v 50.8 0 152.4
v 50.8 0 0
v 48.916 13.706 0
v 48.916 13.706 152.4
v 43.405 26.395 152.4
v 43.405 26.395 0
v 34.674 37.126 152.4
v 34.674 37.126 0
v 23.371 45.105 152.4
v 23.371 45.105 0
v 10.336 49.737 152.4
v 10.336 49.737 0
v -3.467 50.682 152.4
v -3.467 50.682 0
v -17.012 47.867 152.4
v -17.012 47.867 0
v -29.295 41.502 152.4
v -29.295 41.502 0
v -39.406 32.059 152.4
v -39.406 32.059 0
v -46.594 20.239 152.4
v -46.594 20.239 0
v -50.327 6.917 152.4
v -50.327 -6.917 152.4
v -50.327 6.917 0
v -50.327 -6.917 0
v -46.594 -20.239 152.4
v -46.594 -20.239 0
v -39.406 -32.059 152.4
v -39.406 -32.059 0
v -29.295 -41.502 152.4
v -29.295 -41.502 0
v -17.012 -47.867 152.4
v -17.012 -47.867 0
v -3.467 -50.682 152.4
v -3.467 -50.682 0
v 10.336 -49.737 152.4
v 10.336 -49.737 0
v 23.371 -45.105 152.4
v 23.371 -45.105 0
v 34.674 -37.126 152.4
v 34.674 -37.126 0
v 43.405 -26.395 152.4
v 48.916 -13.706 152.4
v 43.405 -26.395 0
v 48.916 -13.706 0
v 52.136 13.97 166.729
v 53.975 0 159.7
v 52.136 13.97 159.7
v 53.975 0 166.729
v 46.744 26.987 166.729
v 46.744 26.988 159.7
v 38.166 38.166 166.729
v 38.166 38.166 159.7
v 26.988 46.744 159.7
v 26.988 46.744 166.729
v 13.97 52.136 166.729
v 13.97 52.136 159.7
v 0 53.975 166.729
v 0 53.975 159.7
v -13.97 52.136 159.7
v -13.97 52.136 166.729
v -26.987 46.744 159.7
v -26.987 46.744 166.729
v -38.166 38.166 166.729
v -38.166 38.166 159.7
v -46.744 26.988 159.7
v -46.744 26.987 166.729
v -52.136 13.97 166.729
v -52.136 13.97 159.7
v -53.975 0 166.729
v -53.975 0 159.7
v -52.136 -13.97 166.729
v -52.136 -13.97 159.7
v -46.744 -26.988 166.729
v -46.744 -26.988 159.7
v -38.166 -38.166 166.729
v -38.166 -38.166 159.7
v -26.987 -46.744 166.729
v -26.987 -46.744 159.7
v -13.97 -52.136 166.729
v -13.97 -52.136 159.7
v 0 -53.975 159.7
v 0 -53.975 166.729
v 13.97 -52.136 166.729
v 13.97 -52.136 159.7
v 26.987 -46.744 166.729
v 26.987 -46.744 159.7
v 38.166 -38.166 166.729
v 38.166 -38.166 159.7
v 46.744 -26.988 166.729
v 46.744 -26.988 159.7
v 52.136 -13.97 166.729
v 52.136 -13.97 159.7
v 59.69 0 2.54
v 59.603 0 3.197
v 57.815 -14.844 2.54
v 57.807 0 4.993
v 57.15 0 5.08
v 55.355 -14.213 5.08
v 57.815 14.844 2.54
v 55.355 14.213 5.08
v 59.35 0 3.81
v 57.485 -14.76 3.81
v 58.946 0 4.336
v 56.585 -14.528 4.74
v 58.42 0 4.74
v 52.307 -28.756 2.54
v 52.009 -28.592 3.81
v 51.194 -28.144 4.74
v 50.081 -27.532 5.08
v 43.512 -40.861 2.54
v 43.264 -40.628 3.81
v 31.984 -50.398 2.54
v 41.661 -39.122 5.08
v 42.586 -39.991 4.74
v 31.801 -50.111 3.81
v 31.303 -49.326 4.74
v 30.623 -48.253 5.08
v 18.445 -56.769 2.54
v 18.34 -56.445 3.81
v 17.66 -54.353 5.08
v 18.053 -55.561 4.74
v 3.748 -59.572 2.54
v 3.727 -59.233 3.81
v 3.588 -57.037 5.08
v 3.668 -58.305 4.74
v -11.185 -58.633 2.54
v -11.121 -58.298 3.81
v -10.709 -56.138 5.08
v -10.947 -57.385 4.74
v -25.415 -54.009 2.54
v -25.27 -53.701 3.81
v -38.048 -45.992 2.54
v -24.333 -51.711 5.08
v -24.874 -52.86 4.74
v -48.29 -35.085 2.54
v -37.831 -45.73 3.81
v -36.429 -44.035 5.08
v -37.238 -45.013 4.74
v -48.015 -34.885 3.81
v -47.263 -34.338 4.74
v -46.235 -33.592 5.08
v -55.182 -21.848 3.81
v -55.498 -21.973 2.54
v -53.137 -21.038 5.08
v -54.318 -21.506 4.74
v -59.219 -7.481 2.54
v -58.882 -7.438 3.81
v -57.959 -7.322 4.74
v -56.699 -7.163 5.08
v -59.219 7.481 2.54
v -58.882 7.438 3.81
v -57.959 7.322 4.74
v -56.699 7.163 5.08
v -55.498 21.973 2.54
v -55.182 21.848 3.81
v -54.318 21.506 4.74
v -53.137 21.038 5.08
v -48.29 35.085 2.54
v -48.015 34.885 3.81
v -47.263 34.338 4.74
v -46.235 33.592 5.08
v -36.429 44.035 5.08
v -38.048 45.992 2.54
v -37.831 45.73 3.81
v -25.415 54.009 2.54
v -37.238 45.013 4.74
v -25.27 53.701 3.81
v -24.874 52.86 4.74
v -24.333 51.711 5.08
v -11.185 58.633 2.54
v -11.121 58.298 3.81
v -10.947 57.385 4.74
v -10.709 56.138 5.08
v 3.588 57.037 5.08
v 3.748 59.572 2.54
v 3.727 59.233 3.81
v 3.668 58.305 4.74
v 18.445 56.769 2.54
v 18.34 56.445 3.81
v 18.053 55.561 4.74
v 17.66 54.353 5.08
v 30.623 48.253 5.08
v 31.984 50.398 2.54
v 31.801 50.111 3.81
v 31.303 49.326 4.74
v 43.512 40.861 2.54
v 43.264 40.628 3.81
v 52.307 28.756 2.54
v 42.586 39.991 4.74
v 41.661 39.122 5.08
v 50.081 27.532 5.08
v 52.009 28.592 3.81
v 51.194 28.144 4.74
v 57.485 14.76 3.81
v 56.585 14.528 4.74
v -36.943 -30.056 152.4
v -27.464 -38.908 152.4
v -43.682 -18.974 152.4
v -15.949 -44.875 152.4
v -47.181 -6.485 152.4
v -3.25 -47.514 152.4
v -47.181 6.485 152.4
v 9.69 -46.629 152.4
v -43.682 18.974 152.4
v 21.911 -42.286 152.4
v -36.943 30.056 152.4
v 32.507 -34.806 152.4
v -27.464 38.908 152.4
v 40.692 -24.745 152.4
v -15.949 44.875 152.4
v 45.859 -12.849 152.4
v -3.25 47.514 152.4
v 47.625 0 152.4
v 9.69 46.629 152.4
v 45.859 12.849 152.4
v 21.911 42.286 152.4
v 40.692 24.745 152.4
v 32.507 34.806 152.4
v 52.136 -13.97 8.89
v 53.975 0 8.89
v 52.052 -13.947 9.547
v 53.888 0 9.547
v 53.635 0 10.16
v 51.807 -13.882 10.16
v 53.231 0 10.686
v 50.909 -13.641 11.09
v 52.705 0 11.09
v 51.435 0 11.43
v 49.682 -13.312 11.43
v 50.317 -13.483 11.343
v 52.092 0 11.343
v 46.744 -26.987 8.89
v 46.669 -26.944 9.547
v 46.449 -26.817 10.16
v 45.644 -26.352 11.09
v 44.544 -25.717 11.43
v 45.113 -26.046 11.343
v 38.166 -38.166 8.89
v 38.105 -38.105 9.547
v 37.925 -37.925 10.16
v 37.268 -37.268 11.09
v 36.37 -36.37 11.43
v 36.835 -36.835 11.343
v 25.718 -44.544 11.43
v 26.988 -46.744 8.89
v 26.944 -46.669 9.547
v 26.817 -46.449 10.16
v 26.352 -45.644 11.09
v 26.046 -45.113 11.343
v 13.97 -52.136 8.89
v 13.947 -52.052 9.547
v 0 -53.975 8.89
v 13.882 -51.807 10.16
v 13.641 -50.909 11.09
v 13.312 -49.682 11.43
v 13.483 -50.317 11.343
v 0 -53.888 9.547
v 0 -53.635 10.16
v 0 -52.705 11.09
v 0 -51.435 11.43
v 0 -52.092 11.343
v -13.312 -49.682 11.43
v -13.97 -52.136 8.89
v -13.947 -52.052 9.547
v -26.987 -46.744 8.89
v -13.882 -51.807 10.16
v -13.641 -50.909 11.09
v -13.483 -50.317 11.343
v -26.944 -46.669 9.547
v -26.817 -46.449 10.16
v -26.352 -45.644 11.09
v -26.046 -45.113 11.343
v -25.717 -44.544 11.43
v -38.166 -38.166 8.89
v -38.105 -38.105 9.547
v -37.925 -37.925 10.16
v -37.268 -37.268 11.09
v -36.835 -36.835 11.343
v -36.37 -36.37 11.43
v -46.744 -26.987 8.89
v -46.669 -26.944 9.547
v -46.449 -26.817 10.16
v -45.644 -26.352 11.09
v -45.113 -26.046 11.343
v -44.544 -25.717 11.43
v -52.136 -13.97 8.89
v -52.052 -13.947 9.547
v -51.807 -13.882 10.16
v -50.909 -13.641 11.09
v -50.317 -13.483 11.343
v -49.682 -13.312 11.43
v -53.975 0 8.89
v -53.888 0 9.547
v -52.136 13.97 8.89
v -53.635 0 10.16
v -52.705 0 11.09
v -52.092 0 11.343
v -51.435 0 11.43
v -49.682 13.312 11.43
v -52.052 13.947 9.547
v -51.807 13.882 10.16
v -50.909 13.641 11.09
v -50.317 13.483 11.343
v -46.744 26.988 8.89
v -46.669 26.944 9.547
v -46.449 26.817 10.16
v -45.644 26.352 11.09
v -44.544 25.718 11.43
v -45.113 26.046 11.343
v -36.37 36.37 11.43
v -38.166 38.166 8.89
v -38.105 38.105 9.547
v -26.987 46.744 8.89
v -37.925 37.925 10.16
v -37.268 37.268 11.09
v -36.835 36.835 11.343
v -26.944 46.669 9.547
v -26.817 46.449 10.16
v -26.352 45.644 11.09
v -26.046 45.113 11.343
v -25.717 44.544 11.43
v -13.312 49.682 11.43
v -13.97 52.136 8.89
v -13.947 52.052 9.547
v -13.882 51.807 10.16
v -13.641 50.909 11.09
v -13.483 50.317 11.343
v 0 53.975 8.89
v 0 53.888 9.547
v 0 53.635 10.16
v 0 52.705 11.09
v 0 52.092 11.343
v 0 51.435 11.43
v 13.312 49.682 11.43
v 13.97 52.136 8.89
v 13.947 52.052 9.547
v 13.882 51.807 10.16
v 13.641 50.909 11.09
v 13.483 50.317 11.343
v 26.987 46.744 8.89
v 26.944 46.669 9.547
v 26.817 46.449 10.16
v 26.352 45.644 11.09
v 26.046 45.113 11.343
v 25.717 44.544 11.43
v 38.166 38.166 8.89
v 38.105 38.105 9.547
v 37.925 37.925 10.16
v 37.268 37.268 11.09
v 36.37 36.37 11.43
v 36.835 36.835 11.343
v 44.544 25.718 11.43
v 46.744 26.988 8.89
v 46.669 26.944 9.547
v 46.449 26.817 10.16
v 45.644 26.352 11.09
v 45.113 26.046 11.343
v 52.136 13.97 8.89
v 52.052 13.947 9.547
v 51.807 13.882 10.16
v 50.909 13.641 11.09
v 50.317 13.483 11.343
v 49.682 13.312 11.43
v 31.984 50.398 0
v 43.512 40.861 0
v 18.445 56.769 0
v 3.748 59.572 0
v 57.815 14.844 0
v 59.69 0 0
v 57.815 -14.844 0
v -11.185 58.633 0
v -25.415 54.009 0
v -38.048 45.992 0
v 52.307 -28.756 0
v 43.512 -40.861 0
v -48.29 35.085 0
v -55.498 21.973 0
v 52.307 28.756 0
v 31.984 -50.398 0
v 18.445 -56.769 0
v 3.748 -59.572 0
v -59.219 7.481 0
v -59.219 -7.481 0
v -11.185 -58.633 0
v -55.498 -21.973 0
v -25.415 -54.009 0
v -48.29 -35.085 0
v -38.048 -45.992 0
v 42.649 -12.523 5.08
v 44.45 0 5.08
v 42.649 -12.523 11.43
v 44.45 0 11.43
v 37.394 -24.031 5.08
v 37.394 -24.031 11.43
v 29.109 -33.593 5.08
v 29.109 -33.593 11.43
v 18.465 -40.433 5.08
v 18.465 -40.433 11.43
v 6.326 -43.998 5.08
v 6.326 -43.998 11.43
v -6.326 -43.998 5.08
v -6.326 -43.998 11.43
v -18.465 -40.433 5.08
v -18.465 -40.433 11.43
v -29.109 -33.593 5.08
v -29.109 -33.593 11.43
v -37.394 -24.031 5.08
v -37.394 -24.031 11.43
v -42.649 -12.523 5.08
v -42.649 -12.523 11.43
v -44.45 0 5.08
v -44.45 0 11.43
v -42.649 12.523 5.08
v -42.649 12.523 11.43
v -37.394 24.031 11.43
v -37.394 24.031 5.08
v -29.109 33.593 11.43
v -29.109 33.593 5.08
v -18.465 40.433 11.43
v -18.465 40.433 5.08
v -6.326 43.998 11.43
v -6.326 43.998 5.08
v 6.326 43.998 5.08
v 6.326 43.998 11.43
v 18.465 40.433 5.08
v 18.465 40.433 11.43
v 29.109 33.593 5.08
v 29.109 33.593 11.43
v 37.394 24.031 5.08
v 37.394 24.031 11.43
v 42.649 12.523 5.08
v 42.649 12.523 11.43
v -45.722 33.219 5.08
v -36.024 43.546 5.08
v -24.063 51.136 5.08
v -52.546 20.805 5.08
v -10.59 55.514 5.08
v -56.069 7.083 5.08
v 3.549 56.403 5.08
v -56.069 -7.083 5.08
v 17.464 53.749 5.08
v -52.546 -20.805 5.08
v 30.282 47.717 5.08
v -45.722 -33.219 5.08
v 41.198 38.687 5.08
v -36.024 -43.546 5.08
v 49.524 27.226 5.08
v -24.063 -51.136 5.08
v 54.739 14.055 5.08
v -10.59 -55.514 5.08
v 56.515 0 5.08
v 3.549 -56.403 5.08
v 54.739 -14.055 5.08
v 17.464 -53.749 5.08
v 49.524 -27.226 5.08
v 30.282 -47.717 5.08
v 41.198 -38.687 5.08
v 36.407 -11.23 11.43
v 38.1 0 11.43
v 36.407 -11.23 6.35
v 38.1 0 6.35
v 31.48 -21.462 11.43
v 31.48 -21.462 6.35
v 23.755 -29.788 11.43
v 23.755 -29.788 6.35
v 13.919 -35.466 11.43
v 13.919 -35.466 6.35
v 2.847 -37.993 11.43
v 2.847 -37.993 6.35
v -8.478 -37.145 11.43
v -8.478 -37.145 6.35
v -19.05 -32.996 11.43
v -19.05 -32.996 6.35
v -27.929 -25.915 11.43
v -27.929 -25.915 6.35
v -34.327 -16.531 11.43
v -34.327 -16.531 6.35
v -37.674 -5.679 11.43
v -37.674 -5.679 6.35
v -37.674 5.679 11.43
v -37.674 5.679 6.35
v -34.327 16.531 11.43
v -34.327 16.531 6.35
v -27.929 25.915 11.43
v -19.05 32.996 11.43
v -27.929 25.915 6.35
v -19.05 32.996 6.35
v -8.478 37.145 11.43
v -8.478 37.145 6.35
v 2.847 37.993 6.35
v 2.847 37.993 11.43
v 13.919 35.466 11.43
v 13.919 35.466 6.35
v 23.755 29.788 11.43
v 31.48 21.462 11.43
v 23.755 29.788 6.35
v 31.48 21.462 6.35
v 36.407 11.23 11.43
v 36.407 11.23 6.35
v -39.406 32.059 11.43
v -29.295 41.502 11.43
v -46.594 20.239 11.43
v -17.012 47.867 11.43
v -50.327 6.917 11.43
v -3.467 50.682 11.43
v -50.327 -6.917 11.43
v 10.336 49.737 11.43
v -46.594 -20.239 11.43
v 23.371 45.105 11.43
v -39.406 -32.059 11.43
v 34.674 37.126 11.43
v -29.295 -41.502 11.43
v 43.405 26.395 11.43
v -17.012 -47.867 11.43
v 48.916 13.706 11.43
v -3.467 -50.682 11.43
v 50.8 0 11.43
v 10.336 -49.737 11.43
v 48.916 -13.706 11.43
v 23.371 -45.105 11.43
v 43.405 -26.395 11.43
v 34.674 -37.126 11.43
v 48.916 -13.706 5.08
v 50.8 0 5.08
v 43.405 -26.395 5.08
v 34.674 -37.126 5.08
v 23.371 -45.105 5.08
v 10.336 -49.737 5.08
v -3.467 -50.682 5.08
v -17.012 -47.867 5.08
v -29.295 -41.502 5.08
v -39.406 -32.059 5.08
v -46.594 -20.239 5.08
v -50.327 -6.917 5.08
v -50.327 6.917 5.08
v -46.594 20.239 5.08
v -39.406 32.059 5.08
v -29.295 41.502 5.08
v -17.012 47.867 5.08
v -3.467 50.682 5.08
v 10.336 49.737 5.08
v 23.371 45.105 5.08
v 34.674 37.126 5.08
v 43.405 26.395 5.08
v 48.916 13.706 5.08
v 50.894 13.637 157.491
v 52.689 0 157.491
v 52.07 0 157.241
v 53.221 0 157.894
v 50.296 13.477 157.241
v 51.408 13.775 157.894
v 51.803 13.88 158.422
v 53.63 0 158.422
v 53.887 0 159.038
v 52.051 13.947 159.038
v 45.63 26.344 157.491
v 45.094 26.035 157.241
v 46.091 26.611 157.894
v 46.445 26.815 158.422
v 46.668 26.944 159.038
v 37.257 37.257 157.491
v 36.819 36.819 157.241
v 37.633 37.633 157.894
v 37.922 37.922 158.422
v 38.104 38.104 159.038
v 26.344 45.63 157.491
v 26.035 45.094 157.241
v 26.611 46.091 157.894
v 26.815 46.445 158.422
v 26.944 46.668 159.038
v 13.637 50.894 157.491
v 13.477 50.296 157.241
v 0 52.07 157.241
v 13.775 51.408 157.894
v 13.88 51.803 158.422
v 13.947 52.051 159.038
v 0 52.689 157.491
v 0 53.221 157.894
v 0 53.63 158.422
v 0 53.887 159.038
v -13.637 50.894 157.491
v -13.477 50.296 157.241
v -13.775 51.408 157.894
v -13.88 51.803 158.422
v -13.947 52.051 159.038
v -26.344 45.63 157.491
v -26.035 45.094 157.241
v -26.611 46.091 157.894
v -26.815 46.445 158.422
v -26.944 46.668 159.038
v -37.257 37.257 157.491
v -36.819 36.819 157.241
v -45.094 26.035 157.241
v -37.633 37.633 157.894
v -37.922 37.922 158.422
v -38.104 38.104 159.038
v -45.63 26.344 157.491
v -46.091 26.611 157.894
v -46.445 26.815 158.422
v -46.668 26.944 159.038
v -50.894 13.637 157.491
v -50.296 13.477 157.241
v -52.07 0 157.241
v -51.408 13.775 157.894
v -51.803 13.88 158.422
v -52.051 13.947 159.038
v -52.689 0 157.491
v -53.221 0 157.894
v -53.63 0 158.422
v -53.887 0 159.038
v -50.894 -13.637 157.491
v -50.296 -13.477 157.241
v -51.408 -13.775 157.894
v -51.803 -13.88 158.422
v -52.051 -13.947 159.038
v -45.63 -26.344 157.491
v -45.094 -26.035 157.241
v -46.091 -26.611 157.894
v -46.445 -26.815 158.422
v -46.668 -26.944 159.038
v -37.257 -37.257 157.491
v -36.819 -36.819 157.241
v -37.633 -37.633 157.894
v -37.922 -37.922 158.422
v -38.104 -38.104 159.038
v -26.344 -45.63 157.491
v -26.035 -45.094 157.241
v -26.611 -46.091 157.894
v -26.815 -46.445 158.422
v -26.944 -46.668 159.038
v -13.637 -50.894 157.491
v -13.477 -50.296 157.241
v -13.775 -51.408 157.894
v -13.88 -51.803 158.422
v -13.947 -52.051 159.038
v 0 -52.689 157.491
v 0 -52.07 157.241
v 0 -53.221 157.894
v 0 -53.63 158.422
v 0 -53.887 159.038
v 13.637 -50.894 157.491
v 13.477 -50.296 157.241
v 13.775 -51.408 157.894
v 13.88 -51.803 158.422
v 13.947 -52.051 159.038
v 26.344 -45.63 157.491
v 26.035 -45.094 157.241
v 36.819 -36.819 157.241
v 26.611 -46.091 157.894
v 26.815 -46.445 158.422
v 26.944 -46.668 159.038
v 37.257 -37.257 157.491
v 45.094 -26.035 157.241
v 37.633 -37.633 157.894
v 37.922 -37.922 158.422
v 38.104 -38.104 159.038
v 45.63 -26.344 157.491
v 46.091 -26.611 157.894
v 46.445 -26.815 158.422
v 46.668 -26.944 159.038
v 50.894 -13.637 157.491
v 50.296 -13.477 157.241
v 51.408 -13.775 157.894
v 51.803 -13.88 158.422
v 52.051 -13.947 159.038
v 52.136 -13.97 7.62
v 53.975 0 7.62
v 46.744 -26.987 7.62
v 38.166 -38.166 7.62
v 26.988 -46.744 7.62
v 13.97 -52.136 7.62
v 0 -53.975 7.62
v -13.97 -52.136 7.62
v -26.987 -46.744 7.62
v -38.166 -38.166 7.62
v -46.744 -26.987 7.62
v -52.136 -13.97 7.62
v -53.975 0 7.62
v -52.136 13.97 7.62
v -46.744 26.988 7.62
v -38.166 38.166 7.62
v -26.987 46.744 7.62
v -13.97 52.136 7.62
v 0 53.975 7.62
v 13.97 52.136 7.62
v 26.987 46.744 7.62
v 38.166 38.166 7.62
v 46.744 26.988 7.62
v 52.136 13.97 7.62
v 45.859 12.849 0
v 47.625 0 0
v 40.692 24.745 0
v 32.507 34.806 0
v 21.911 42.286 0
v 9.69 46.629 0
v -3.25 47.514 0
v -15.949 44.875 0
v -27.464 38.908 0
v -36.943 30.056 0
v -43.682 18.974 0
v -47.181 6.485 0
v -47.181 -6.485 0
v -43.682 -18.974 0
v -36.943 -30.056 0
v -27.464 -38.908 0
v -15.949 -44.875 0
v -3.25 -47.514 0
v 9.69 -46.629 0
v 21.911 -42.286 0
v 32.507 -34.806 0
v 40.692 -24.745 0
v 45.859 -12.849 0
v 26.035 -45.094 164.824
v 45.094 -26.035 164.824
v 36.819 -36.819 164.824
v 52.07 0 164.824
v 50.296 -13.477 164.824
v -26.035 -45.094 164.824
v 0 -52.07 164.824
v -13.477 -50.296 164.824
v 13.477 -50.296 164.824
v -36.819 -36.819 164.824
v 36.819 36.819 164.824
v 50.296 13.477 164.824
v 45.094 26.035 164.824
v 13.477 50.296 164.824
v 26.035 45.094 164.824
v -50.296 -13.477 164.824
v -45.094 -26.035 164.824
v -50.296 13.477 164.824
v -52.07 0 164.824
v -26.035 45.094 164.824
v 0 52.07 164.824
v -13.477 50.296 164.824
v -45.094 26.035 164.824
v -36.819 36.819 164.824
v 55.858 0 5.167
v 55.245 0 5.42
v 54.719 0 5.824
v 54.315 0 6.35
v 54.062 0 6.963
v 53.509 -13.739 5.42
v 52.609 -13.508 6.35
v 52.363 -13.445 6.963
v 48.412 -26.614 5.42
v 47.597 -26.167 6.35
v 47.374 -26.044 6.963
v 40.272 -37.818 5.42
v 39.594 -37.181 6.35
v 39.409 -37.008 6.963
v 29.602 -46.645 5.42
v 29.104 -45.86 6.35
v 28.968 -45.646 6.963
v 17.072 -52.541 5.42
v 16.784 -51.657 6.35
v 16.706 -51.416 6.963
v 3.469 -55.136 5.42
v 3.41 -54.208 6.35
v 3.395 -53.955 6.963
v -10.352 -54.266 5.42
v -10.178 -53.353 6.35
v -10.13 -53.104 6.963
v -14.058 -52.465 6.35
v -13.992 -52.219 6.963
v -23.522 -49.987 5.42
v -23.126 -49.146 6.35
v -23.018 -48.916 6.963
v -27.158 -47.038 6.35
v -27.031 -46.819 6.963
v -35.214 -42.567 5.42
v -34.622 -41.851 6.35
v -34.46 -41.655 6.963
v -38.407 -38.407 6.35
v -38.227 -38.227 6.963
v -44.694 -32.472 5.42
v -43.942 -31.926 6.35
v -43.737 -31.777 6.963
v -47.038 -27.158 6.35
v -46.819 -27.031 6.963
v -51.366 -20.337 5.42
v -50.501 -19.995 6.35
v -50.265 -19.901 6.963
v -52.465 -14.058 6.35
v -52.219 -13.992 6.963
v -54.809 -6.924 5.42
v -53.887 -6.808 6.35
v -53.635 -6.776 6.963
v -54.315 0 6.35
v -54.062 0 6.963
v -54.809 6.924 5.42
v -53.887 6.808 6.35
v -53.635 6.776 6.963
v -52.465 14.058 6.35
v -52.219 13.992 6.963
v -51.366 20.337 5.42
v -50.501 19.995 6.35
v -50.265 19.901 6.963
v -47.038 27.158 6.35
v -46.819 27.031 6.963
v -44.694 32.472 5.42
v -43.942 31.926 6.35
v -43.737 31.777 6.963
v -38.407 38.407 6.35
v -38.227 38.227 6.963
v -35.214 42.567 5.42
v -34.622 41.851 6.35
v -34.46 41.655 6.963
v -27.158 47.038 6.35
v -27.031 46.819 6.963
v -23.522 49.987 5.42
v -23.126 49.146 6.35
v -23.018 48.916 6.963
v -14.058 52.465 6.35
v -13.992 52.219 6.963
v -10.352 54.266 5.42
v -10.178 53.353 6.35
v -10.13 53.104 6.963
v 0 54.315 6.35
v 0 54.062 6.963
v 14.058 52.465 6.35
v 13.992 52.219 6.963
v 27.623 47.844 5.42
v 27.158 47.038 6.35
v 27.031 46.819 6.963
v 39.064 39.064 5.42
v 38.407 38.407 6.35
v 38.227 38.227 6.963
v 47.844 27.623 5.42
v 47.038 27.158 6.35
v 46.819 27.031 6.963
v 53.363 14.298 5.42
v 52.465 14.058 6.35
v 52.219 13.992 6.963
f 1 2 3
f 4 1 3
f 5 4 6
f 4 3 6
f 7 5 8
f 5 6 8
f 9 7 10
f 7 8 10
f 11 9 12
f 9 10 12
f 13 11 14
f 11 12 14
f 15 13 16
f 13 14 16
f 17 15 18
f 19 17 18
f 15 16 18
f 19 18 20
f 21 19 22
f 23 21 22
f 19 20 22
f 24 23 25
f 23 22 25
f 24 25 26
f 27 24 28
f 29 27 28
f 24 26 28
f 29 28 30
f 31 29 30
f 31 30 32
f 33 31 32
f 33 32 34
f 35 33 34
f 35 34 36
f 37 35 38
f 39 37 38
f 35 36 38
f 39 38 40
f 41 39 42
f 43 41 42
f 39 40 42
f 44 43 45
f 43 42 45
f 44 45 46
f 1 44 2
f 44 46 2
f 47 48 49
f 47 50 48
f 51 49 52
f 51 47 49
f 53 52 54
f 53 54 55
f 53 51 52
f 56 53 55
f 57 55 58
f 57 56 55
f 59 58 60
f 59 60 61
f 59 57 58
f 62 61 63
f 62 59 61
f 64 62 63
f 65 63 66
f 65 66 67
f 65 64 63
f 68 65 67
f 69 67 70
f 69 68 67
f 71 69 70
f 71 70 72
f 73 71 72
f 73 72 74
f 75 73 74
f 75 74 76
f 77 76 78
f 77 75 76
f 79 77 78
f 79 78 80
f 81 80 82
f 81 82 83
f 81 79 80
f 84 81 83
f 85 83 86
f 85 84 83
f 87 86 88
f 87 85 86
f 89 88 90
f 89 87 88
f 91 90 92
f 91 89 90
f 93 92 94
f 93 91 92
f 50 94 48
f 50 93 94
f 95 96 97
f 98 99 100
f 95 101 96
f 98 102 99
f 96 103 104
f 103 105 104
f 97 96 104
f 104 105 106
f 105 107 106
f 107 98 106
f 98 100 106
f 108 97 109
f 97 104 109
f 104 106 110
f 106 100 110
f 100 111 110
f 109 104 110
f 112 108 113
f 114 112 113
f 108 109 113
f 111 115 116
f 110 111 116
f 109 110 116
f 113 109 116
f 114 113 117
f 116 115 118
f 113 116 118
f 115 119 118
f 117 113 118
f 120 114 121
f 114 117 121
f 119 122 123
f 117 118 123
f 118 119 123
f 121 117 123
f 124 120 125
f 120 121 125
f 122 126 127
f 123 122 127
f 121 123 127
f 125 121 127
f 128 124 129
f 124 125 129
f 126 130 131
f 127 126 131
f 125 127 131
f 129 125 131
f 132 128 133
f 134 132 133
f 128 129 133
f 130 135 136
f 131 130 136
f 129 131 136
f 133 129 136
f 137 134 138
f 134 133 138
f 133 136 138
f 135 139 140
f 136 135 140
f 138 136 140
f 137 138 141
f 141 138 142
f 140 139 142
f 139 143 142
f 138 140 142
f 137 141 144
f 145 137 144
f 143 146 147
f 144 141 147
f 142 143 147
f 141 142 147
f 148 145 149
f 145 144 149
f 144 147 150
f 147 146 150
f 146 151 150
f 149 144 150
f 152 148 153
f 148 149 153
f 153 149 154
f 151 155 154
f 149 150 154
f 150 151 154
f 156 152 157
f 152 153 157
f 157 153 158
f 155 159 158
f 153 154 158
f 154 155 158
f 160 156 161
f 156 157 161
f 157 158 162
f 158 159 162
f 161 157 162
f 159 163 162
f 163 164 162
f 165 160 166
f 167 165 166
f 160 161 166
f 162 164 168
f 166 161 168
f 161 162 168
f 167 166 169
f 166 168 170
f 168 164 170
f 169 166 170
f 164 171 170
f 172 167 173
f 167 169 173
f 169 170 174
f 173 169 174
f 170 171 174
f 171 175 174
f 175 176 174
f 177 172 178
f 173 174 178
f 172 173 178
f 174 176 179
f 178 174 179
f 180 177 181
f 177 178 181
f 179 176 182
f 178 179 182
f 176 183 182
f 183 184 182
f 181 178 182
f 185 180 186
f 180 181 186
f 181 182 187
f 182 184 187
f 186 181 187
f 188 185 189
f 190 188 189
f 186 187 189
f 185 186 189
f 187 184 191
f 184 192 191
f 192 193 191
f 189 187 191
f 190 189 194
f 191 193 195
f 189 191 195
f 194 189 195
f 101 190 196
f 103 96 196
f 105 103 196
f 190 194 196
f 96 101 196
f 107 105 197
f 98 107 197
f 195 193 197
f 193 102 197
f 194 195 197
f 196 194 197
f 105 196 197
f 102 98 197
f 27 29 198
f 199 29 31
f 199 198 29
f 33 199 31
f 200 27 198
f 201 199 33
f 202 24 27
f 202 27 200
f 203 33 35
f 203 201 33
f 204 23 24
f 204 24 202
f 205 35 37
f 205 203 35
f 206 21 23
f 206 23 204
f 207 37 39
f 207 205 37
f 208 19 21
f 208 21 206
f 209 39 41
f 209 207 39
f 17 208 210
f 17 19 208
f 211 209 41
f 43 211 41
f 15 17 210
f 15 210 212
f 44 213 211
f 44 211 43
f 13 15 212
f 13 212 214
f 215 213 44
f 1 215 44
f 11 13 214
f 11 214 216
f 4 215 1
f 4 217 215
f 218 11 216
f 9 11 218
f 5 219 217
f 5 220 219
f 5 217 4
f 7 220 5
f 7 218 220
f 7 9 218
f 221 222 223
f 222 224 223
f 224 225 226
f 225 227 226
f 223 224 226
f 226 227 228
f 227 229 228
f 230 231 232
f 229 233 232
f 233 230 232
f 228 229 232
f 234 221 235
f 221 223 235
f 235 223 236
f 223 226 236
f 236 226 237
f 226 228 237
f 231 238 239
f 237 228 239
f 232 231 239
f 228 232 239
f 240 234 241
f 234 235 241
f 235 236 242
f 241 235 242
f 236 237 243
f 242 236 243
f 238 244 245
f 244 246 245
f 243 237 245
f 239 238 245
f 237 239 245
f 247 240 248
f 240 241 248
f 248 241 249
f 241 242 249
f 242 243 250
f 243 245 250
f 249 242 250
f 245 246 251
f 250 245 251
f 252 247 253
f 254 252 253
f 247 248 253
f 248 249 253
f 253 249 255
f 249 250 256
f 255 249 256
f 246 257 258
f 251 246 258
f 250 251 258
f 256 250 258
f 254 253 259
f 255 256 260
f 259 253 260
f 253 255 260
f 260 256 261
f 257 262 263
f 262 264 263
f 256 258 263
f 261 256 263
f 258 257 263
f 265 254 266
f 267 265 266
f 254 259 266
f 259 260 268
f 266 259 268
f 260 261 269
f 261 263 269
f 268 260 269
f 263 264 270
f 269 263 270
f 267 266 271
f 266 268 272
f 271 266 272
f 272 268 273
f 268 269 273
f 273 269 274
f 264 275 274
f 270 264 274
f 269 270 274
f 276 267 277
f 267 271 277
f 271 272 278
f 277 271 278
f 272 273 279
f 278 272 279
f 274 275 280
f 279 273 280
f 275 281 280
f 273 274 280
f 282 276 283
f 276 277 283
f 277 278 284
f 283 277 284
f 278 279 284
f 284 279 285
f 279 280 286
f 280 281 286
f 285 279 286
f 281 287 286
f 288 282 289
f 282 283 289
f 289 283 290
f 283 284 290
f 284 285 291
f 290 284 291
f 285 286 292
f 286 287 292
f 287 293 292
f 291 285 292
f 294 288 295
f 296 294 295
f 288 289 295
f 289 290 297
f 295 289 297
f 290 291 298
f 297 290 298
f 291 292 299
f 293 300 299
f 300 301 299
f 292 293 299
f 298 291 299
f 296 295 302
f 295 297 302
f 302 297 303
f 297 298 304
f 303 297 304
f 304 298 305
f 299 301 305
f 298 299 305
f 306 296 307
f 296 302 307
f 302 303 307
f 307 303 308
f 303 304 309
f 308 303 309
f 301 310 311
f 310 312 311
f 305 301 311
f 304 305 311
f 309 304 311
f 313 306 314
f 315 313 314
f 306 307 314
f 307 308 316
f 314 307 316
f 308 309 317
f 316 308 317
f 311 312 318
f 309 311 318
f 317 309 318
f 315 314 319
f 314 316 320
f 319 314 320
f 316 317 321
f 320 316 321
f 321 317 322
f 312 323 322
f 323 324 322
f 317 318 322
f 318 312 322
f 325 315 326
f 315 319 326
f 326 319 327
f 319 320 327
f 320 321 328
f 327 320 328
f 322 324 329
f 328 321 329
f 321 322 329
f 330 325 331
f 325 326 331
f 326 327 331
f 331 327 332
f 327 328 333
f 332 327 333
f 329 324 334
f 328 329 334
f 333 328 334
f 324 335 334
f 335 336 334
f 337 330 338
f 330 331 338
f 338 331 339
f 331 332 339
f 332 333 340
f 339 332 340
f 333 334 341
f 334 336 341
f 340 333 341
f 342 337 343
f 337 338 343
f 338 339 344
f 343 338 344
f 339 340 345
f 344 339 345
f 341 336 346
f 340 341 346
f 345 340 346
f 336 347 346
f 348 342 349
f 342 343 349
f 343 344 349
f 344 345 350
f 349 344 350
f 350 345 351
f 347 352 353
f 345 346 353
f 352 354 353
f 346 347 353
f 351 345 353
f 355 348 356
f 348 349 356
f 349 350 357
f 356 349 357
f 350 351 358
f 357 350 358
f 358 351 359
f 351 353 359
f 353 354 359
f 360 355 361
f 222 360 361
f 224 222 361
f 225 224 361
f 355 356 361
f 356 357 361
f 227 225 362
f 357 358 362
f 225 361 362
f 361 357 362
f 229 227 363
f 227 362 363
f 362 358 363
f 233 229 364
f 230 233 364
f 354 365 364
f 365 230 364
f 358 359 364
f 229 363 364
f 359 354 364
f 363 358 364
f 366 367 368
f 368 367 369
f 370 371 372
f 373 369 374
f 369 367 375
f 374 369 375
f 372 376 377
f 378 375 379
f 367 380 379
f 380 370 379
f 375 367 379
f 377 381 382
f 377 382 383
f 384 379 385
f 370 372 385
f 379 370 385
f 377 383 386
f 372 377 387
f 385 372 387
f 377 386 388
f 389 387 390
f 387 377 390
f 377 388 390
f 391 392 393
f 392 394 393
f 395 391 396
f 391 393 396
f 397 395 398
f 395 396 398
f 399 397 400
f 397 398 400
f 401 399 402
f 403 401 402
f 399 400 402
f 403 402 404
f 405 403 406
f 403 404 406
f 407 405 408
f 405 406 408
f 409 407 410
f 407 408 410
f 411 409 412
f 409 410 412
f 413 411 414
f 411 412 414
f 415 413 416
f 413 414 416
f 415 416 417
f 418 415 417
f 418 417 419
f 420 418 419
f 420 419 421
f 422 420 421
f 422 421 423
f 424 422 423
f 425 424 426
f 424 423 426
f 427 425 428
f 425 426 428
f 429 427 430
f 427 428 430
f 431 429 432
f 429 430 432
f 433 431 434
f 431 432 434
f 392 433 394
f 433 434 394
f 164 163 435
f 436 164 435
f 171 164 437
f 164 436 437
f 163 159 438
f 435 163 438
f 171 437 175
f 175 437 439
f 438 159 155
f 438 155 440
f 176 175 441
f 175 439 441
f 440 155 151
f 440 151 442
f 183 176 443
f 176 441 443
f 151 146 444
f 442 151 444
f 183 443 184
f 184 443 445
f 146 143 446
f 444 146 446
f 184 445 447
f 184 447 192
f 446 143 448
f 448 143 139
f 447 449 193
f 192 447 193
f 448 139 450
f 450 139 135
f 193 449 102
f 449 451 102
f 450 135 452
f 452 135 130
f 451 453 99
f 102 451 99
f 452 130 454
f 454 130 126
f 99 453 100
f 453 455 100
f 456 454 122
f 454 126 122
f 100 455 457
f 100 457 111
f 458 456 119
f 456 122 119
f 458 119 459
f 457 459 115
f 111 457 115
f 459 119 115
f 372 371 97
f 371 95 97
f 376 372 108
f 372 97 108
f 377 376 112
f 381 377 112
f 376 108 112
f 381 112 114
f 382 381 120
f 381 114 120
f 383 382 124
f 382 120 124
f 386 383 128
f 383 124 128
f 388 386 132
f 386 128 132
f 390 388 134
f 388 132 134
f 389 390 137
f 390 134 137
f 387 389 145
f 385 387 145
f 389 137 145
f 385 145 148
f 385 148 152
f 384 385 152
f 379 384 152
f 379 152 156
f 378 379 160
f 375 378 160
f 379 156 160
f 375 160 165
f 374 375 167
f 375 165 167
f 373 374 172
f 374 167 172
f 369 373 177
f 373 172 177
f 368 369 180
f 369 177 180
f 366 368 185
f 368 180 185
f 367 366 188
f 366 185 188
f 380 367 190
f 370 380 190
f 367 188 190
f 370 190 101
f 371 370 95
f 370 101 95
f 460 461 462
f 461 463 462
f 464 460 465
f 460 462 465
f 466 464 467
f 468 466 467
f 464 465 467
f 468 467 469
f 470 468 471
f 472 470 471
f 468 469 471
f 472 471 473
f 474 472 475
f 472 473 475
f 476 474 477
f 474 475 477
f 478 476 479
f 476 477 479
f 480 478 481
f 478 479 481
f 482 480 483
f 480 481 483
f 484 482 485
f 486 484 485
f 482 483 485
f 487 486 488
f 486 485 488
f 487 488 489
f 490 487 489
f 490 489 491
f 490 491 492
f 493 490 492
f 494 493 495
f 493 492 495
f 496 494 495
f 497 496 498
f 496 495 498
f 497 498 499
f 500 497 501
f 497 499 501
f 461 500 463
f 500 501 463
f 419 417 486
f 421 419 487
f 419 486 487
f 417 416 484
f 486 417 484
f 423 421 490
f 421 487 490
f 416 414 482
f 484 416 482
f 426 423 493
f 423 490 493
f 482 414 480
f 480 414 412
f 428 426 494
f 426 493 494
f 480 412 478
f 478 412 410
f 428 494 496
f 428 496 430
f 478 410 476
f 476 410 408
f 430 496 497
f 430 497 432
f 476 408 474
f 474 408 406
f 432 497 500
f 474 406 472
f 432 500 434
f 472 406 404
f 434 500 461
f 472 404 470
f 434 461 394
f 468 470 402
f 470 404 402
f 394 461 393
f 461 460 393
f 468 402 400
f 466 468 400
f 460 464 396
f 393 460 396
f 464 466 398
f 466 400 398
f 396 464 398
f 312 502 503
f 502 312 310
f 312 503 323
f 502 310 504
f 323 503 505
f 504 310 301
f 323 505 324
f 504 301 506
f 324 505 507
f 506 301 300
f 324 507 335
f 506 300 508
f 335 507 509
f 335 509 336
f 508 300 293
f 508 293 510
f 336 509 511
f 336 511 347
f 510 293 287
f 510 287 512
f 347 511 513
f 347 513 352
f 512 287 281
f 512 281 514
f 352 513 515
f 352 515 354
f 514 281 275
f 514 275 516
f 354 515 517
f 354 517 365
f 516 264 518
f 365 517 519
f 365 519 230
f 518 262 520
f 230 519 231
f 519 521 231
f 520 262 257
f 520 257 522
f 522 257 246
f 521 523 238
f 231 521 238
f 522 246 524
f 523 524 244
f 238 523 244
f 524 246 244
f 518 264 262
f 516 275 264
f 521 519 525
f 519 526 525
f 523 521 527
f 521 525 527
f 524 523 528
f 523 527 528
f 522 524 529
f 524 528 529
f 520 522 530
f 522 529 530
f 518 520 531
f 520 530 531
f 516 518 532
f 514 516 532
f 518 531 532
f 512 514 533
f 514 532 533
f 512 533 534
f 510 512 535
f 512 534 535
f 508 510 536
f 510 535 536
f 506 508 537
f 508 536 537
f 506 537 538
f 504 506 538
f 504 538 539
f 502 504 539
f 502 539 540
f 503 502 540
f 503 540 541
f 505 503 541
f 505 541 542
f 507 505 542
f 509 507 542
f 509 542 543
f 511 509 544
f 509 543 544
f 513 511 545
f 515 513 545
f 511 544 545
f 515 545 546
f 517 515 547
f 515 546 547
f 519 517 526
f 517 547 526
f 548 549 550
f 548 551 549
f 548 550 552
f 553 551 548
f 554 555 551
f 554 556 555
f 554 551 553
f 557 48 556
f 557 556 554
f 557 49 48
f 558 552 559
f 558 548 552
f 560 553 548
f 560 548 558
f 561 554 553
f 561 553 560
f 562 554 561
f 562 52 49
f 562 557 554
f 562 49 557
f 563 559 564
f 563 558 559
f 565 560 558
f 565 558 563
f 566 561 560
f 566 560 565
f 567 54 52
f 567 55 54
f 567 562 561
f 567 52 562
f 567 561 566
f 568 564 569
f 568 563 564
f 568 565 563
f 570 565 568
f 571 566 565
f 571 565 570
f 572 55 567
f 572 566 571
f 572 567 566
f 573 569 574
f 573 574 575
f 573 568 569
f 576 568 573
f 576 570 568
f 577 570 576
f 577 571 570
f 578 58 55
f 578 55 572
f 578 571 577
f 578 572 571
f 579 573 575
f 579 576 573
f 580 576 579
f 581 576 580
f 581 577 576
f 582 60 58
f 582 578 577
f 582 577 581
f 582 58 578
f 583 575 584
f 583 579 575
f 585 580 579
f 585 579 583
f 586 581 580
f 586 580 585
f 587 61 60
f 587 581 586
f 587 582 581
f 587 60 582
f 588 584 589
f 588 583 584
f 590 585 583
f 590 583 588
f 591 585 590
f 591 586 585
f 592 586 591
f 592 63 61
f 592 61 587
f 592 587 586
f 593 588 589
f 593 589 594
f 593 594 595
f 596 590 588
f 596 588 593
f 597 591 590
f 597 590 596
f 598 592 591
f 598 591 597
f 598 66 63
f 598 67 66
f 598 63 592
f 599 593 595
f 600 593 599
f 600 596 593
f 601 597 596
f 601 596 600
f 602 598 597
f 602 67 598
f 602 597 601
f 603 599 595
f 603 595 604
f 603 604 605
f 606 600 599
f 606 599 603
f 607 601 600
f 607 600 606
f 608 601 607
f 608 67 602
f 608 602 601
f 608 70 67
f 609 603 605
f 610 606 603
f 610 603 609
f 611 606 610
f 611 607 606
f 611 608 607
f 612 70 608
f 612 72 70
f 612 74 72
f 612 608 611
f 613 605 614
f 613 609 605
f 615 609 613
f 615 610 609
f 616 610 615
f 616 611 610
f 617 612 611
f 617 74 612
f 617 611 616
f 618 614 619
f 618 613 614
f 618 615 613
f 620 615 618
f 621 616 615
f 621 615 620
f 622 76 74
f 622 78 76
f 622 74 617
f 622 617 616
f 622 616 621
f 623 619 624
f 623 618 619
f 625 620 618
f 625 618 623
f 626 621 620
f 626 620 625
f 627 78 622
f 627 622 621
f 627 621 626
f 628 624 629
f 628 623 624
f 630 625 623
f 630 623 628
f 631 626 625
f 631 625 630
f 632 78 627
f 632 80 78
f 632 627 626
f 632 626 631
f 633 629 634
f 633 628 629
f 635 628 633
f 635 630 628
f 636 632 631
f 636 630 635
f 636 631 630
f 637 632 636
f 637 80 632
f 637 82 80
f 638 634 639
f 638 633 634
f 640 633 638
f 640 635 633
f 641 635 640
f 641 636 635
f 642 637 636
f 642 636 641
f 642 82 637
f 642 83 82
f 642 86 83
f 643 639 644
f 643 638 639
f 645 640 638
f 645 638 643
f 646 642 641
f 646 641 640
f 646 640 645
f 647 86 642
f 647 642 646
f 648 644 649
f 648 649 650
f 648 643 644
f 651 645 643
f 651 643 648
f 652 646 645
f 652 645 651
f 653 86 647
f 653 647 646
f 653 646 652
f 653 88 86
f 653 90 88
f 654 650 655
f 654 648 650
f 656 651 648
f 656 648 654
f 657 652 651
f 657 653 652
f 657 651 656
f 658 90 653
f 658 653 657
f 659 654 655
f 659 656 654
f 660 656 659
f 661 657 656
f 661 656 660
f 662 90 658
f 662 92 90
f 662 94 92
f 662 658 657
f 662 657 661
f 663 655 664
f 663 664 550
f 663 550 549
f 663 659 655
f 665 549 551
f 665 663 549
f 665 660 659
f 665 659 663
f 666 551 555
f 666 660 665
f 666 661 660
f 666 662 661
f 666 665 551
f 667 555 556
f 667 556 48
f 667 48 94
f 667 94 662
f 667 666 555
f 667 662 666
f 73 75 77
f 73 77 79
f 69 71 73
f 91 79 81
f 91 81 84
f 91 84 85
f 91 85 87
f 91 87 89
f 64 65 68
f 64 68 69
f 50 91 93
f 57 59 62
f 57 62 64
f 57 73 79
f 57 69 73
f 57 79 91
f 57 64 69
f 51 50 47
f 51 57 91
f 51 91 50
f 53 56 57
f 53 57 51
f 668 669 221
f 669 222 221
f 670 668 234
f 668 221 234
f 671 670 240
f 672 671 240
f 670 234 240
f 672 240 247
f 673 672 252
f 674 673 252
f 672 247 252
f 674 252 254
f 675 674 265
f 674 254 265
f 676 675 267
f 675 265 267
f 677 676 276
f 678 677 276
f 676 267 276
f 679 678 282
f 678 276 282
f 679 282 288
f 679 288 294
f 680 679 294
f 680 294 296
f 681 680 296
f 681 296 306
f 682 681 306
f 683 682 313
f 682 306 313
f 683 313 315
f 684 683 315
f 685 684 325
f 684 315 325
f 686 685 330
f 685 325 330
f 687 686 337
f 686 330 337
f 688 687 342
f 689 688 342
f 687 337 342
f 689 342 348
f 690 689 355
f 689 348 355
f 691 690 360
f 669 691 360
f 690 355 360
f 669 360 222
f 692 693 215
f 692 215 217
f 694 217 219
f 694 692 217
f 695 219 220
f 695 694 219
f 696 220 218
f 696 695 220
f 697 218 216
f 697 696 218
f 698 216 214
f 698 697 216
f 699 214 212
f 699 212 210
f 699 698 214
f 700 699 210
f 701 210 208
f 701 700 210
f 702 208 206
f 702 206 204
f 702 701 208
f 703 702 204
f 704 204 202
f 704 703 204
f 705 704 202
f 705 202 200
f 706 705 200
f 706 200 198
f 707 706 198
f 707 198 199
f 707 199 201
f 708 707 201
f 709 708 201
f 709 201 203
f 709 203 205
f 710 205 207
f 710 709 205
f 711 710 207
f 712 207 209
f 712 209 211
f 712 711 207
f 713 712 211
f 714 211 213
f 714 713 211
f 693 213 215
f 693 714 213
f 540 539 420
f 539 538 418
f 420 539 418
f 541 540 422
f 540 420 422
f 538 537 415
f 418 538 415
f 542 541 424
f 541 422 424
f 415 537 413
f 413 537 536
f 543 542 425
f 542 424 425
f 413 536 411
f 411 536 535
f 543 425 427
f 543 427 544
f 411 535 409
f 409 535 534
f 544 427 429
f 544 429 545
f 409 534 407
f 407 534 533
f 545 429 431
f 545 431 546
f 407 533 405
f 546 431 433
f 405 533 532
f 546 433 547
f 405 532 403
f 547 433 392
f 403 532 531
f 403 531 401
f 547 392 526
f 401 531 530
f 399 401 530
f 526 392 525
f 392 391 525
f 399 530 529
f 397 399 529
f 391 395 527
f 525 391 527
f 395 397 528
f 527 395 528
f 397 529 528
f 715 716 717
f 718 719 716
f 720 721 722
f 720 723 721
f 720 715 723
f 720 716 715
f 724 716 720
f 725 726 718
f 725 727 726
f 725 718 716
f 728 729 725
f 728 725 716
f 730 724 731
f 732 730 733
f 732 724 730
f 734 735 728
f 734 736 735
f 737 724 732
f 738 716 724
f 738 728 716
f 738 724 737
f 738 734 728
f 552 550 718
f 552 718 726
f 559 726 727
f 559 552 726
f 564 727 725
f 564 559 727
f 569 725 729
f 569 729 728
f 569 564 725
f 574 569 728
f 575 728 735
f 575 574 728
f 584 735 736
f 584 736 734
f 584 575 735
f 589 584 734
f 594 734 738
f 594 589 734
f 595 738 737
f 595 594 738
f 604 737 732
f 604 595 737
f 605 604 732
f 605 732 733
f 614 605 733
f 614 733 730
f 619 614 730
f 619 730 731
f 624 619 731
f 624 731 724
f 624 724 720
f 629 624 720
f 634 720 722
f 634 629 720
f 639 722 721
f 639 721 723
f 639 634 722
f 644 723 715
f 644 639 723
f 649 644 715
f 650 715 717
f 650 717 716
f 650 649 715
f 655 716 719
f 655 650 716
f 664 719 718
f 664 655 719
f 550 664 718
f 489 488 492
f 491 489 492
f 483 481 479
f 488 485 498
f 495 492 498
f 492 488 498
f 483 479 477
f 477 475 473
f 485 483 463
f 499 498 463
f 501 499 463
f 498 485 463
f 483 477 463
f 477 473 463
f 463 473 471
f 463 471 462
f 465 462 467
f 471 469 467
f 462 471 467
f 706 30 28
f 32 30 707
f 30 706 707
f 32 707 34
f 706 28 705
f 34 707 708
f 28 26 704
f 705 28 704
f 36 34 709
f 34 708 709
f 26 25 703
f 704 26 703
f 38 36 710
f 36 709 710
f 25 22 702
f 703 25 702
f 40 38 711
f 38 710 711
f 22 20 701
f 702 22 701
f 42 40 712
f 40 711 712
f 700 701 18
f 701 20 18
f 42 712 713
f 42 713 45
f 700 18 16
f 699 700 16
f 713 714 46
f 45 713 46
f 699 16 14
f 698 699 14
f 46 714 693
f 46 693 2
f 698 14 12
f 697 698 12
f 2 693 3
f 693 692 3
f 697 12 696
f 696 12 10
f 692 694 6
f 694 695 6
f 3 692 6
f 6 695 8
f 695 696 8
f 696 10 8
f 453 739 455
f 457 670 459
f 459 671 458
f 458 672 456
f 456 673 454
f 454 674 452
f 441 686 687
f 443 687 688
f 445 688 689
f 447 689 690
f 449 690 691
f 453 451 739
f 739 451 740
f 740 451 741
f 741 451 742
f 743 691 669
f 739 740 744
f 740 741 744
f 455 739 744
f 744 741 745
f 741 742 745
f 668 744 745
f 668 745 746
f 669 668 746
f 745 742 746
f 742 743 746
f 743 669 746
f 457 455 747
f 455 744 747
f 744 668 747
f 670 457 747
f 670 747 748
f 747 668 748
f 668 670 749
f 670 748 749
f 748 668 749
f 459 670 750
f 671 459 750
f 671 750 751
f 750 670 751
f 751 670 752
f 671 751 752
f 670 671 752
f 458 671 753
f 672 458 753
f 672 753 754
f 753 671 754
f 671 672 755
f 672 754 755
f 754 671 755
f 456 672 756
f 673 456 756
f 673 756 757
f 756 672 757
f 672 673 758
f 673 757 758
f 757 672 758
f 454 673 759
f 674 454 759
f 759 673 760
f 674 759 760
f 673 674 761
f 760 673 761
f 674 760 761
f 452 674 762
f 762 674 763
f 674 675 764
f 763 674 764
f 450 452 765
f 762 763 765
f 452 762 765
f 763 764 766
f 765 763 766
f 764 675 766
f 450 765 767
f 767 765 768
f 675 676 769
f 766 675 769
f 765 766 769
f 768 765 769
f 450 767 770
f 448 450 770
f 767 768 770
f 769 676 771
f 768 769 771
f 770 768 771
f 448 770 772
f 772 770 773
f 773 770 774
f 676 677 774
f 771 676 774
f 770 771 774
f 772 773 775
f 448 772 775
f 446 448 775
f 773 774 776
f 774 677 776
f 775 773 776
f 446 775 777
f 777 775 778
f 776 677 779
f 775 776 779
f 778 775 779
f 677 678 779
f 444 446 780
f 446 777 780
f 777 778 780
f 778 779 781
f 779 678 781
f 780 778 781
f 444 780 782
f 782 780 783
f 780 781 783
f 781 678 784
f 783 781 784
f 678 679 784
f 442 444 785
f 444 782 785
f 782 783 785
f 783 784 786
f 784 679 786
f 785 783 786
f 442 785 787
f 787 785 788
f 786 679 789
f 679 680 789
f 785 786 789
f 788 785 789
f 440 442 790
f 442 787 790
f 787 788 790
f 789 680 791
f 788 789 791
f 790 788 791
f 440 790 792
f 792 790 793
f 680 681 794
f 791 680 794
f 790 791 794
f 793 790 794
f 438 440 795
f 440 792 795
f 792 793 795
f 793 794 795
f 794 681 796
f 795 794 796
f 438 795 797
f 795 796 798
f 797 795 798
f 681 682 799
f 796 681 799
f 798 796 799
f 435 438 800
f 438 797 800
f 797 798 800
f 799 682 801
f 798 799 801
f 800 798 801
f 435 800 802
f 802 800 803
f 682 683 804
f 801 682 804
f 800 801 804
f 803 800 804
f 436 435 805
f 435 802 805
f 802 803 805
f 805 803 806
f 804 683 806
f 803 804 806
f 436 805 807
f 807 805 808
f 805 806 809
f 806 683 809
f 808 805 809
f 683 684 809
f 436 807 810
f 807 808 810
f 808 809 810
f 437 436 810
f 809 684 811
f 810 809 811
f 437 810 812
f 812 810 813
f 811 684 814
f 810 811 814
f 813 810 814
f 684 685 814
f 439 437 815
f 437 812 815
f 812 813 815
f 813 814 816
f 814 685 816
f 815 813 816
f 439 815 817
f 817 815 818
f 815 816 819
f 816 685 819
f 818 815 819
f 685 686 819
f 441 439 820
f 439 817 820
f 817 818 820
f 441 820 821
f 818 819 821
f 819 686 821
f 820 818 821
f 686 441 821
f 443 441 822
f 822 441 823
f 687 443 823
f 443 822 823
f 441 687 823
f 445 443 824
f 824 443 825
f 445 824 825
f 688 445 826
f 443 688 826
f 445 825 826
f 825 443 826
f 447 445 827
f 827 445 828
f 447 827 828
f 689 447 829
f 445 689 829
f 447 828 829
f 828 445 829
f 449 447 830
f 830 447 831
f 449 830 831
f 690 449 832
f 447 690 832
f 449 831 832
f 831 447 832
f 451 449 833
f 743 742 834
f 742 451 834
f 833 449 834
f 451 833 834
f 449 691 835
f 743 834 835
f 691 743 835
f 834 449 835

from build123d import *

# Parameters (mm, degrees)
F0_R     = 50.8
F0_R_2   = 47.625
F1_DEPTH = 152.4


# Not quite as in the source:
# - a fillet or chamfer that OpenCascade refuses, or shapes differently, is made with other operations: its cross-section is extruded or revolved along the edge and cut away or added


with BuildPart() as f1:
    # F0 (on Top) → F1 (new body)
    with BuildSketch(Plane.XY):
        Circle(F0_R)
        Circle(F0_R_2, mode=Mode.SUBTRACT)
    extrude(amount=F1_DEPTH)


with BuildPart() as f3:
    # F2 (on Front) → F3 (revolve)
    with BuildSketch(Plane.XZ):
        with BuildLine():
            Line((0, 6.35), (0, 0))
            Line((0, 0), (59.69, 0))
            Line((59.69, 0), (59.69, 2.54))
            ThreePointArc((59.69, 2.54), (58.9460512242, 4.3360512242), (57.15, 5.08))
            Line((57.15, 5.08), (56.515, 5.08))
            ThreePointArc((56.515, 5.08), (54.7189487758, 5.8239487758), (53.975, 7.62))
            Line((53.975, 7.62), (53.975, 8.89))
            ThreePointArc((53.975, 8.89), (53.2310512242, 10.6860512242), (51.435, 11.43))
            Line((51.435, 11.43), (50.8, 11.43))
            Line((50.8, 11.43), (50.8, 5.08))
            Line((50.8, 5.08), (44.45, 5.08))
            Line((44.45, 5.08), (44.45, 11.43))
            Line((44.45, 11.43), (38.1, 11.43))
            Line((38.1, 11.43), (38.1, 6.35))
            Line((38.1, 6.35), (0, 6.35))
        make_face()
    revolve(axis=Axis((0, 0, 3.175), (0, 0, -1)))


with BuildPart() as f5:
    # F4 (on Front) → F5 (revolve)
    with BuildSketch(Plane.XZ):
        Polygon((53.975, 166.7292495387), (0, 166.7292495387), (0, 164.8242495387), (52.07, 164.8242495387), (52.07, 157.24065432), (53.975, 157.24065432), align=None)
    revolve(axis=Axis((0, 0, 165.7767495387), (0, 0, 1)))

    # F6: fillet of radius 2.54 on 1 edges, made by hand

    # F6_s1 → F6_t2 (revolve, cut)
    with BuildSketch(Plane.XZ):
        with BuildLine():
            ThreePointArc((52.07, 157.24065432), (53.4430463142, 158.1445727582), (53.975, 159.6999987449))
            Line((53.975, 159.6999987449), (53.975, 157.24065432))
            Line((53.975, 157.24065432), (52.07, 157.24065432))
        make_face()
    revolve(axis=Axis((0, 0, 157.24065432), (0, 0, 1)), mode=Mode.SUBTRACT)


solid = Compound([f1.part, f3.part, f5.part])
